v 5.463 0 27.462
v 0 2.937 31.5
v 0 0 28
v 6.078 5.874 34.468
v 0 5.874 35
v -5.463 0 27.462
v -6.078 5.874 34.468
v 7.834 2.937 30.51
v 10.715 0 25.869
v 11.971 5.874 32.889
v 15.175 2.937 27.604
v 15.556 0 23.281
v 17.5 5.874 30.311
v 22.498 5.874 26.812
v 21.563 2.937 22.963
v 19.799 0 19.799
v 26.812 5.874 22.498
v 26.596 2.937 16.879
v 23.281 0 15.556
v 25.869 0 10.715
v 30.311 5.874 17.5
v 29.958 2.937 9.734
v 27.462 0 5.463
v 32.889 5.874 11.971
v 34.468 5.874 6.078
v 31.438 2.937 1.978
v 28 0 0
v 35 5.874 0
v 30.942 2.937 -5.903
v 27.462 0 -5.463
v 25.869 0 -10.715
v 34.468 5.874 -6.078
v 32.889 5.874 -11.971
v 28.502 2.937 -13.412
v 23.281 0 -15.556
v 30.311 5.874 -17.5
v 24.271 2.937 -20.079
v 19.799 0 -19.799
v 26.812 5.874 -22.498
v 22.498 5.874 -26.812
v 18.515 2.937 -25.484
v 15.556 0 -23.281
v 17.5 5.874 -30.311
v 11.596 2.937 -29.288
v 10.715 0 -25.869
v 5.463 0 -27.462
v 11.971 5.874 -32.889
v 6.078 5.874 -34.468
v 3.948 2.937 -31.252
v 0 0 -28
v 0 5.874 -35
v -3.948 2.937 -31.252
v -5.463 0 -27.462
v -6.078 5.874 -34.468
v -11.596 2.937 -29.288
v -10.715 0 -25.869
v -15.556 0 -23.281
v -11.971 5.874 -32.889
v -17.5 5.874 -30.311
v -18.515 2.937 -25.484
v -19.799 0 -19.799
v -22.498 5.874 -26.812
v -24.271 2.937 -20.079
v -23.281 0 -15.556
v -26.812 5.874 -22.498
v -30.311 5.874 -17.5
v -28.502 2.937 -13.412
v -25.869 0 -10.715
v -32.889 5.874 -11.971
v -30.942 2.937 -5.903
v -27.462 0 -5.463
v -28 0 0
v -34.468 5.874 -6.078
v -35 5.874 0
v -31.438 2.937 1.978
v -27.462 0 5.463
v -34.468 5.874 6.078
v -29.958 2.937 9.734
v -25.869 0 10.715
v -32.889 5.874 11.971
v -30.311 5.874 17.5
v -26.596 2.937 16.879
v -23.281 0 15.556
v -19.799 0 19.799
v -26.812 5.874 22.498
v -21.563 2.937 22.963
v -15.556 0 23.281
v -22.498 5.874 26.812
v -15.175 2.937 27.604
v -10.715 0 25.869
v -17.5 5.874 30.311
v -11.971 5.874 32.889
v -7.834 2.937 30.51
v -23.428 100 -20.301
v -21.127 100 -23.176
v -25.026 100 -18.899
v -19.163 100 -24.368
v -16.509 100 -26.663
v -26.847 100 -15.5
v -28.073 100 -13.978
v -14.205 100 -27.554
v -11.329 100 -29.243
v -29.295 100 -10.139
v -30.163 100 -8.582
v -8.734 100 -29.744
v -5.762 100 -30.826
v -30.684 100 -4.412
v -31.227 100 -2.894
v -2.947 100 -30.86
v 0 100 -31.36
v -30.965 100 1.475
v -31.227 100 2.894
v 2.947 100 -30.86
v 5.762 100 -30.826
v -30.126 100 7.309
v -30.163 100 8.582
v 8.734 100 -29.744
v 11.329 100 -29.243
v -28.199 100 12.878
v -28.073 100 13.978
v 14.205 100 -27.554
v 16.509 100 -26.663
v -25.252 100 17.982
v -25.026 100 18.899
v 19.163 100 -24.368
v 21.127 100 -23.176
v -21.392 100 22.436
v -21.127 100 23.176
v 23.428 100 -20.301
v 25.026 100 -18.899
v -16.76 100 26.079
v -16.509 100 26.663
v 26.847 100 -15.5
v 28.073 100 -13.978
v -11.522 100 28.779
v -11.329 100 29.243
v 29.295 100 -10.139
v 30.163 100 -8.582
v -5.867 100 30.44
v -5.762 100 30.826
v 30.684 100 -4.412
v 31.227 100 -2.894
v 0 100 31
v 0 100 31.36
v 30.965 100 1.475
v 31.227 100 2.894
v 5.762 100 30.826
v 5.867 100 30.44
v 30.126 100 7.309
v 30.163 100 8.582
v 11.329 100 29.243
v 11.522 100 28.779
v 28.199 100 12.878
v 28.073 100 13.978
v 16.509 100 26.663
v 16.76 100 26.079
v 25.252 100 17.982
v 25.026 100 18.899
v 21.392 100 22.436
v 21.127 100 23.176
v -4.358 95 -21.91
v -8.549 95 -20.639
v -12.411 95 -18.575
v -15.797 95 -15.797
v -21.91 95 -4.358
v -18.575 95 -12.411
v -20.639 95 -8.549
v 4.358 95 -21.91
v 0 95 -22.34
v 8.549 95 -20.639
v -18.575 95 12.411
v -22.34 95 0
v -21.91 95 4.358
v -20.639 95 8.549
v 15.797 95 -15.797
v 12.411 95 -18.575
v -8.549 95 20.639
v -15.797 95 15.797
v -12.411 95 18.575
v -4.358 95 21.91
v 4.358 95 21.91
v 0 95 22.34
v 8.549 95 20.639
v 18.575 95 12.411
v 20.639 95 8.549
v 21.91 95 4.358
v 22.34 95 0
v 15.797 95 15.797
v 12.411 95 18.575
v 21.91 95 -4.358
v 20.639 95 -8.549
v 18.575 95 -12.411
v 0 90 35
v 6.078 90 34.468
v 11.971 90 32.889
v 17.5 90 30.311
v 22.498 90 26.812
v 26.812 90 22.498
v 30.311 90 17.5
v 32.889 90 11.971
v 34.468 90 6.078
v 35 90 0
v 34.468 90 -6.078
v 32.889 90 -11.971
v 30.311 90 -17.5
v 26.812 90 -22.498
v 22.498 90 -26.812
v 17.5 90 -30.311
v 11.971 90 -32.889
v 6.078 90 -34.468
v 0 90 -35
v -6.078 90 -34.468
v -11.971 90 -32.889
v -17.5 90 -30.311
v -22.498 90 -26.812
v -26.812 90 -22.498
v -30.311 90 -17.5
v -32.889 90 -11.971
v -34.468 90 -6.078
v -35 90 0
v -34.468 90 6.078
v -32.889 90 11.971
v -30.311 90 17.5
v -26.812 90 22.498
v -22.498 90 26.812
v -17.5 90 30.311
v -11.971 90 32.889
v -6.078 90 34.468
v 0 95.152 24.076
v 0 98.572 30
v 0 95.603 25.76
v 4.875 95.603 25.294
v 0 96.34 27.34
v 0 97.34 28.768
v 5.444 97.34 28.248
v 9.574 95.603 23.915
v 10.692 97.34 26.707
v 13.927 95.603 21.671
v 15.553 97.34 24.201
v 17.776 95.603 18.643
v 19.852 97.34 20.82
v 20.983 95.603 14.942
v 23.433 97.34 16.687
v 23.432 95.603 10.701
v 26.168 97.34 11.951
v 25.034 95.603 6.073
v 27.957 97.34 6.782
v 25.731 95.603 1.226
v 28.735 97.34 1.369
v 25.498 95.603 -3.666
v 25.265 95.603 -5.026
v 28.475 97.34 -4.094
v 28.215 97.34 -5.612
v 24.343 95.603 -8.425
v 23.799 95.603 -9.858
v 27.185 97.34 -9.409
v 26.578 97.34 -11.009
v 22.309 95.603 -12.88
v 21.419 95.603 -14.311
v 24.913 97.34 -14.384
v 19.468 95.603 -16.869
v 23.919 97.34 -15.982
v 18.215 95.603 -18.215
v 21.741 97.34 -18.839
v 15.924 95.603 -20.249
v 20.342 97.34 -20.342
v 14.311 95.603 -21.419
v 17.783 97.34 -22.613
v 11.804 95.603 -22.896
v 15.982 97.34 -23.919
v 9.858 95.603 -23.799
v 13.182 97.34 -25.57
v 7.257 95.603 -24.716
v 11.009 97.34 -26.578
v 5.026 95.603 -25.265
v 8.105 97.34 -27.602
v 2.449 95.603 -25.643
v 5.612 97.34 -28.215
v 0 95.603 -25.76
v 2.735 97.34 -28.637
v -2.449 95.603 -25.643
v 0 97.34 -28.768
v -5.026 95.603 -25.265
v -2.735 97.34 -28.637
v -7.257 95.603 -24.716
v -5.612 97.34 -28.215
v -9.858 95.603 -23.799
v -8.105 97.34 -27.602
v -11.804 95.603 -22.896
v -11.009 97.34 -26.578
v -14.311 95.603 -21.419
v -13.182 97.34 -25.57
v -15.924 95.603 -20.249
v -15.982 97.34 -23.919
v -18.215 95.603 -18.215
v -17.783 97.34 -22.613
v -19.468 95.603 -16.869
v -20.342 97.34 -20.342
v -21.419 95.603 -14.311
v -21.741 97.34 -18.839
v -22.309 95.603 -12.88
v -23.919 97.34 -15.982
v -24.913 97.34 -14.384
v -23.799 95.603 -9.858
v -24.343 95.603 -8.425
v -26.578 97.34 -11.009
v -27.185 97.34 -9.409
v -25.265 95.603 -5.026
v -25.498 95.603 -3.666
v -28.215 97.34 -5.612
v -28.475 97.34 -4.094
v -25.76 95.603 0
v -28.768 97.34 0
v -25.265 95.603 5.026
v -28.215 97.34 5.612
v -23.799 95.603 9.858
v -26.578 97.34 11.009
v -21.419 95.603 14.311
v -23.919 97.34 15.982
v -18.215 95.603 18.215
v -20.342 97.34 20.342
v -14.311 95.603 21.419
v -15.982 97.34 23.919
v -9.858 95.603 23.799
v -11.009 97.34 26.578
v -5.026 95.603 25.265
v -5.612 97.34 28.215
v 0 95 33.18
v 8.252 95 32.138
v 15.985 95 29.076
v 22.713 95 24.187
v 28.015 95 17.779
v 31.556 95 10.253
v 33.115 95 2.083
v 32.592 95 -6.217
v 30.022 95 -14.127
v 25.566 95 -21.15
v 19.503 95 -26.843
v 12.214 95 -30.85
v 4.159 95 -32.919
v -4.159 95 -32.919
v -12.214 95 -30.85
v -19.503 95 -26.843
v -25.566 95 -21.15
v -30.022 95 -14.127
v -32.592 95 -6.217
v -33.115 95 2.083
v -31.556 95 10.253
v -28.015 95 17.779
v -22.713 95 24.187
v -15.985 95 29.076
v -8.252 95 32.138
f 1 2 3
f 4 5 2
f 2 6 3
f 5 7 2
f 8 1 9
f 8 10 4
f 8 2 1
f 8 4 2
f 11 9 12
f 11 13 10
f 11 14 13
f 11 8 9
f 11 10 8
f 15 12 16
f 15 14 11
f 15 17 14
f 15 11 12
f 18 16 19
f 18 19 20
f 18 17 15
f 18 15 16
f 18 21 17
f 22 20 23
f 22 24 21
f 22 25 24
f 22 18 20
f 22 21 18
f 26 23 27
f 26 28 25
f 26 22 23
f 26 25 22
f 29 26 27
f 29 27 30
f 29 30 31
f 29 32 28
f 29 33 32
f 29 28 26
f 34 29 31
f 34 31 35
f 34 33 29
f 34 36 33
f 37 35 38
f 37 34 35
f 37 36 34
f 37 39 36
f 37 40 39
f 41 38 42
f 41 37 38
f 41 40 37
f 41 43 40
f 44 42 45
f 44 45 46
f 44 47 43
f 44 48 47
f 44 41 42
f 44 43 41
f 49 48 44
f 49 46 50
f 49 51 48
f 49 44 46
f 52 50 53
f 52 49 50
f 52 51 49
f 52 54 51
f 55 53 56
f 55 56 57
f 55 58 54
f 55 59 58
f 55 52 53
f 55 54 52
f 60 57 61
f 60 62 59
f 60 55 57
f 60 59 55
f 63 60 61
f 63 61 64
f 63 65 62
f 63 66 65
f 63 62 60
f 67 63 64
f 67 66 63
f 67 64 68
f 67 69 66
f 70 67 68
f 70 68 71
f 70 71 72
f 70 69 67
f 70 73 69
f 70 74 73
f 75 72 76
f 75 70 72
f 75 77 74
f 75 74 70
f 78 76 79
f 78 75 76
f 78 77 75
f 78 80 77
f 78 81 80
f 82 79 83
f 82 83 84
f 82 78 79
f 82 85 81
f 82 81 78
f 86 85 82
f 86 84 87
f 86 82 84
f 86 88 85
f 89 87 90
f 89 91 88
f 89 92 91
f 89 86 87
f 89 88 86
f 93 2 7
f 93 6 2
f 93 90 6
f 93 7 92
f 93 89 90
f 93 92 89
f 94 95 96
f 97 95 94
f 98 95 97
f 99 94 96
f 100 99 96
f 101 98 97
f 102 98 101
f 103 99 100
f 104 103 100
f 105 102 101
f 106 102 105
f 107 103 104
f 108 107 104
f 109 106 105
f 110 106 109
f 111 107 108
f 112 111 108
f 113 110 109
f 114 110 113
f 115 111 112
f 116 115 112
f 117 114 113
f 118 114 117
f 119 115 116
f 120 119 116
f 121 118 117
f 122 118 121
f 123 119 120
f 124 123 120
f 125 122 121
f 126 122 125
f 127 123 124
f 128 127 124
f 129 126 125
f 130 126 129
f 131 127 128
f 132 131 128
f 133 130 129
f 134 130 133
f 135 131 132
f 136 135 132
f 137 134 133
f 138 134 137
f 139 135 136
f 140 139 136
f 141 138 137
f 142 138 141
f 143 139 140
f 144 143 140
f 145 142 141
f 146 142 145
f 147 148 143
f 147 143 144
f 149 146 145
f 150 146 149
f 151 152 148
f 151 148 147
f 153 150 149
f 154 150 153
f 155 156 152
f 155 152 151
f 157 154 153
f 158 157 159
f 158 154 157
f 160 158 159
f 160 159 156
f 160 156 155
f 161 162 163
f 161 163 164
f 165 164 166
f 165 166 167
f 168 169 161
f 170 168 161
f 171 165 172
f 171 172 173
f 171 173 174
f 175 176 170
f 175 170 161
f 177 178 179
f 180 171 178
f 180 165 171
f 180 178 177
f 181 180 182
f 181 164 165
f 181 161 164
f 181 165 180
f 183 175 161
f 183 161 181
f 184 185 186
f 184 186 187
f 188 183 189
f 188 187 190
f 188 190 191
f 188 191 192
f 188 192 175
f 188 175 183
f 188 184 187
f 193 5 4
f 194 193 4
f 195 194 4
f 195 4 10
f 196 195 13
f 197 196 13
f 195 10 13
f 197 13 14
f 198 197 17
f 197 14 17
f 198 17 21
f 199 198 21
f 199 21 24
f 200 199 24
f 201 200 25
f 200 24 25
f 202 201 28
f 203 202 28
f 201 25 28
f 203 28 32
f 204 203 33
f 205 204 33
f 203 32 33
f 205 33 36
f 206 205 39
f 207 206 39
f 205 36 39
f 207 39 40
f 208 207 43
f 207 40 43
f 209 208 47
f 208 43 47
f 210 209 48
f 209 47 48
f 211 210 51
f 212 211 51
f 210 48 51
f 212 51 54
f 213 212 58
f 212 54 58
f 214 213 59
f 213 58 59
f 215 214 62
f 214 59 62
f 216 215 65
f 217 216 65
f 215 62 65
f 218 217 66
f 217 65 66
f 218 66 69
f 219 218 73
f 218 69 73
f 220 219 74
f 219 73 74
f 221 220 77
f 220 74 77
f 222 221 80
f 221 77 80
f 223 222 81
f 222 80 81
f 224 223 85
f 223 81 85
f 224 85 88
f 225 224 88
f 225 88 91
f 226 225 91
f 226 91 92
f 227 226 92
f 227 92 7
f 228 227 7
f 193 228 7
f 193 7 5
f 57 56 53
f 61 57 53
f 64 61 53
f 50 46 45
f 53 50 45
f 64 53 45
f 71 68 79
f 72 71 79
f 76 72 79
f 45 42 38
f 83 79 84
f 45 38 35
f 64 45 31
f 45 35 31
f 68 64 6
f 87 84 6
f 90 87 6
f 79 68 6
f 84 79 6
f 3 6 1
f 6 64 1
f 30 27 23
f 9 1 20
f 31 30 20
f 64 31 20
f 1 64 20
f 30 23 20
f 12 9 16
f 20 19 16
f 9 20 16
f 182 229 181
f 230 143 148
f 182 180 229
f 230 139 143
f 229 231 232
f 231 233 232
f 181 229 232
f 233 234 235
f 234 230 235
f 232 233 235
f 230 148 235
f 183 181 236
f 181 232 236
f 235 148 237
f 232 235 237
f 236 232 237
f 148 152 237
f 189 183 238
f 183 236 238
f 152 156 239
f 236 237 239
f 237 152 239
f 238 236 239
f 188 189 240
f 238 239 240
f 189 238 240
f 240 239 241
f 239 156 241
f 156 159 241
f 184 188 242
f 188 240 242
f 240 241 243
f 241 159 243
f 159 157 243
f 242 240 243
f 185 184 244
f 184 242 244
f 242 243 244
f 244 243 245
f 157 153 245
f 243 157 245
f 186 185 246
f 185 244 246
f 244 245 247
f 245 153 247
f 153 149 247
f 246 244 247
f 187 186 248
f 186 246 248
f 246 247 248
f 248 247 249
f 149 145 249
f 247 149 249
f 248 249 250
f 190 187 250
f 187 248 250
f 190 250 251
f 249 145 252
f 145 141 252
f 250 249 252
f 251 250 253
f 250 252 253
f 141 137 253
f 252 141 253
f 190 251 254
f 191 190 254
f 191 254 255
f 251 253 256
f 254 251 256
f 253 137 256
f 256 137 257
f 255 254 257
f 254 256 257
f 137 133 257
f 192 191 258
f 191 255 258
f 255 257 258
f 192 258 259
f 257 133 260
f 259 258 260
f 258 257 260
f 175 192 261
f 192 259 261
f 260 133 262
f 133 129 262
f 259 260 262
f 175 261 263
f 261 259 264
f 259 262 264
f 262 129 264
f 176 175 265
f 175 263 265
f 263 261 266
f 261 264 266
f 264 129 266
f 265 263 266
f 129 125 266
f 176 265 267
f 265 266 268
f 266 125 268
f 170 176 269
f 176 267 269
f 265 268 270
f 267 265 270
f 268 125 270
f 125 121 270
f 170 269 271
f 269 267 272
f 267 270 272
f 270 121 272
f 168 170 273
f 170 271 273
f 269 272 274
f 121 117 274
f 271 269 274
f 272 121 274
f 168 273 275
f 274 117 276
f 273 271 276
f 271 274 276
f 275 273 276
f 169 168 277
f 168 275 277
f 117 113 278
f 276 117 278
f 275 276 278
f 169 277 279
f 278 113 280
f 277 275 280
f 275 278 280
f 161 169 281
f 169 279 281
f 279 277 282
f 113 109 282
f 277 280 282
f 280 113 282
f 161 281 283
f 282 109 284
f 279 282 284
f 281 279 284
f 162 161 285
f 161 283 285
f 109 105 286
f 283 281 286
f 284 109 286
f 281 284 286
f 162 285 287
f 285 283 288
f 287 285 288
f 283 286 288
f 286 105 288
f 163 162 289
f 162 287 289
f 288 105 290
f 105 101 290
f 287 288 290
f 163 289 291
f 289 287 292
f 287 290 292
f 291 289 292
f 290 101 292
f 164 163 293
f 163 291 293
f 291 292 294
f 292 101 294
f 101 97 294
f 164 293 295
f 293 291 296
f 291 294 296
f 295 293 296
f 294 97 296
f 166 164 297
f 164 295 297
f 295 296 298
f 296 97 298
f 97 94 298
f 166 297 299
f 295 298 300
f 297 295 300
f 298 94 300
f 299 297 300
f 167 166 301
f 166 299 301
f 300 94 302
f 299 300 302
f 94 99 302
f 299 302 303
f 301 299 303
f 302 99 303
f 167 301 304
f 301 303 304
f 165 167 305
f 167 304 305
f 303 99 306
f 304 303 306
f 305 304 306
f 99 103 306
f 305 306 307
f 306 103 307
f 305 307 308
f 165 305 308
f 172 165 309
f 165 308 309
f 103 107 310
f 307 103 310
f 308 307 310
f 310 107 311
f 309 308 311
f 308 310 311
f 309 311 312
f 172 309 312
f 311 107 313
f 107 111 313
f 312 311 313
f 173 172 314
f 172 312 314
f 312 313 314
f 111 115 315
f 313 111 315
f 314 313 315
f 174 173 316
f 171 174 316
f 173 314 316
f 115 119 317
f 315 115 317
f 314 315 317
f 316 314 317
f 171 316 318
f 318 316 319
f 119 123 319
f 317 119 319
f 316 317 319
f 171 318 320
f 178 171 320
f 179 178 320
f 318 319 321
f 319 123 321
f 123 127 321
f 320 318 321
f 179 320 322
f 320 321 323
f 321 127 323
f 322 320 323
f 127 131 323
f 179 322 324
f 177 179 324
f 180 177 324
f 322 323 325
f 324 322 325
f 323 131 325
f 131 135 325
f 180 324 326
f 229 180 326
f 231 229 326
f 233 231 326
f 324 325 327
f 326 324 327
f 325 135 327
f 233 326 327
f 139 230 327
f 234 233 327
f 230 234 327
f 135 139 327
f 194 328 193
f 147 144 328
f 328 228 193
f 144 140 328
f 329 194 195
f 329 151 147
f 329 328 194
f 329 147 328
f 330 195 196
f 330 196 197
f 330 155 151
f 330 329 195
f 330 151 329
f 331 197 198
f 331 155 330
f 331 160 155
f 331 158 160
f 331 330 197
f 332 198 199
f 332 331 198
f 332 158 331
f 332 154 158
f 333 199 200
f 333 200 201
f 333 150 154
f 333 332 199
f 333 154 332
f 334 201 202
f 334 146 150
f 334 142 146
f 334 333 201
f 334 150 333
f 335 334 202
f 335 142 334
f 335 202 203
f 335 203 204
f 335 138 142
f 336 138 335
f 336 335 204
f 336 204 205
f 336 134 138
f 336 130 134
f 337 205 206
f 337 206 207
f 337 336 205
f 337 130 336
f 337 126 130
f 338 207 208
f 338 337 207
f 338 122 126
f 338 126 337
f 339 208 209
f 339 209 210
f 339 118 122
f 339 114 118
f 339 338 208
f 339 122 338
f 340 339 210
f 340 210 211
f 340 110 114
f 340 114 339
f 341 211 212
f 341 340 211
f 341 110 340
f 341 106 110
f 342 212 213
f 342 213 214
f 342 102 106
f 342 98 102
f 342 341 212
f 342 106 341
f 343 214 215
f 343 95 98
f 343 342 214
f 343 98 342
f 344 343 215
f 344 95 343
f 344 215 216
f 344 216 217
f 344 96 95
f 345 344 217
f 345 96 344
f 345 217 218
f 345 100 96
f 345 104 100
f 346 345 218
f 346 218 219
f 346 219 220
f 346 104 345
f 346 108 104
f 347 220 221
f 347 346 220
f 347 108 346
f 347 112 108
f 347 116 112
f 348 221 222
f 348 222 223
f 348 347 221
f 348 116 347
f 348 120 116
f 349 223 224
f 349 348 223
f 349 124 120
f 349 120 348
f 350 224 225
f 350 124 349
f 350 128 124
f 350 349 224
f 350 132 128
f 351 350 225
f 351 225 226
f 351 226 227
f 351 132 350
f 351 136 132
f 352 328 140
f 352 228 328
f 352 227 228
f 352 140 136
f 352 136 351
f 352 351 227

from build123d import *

# Parameters (mm, degrees)
SKETCH1_R           = 35
BOSS_EXTRUDE1_DEPTH = 100
CHAMFER1_SIZE       = 10
CHAMFER1_SIZE2      = 3.639702343
CHAMFER2_SIZE       = 7
CHAMFER2_SIZE2      = 5.873697418
SKETCH2_R           = 31
CUT_EXTRUDE1_DEPTH  = 5
FILLET1_R           = 10


with BuildPart() as part:
    # Sketch1 → Boss-Extrude1 (new body)
    with BuildSketch(Plane(origin=(0, 0, 0), x_dir=(1, 0, 0), z_dir=(0, 1, 0))):
        with Locations(Location((0, 0, 0), (0, 0, 270))):
            Circle(SKETCH1_R)
    extrude(amount=BOSS_EXTRUDE1_DEPTH)

    # Chamfer1
    chamfer1_edges = [part.edges().sort_by_distance(p)[0] for p in [
        (0, 100, -35),
    ]]
    chamfer1_side = [part.faces().sort_by_distance(p)[0] for p in [
        (0, 50, -35),
    ]]
    chamfer(chamfer1_edges, length=CHAMFER1_SIZE, length2=CHAMFER1_SIZE2, reference=chamfer1_side[0])

    # Chamfer2
    chamfer2_edges = [part.edges().sort_by_distance(p)[0] for p in [
        (0, 0, -35),
    ]]
    chamfer2_side = [part.faces().sort_by_distance(p)[0] for p in [
        (0, 0, 0),
    ]]
    chamfer(chamfer2_edges, length=CHAMFER2_SIZE, length2=CHAMFER2_SIZE2, reference=chamfer2_side[0])

    # Sketch2 → Cut-Extrude1 (cut)
    with BuildSketch(Plane(origin=(0, 100, 0), x_dir=(1, 0, 0), z_dir=(0, 1, 0))):
        with Locations(Location((0, 0, 0), (0, 0, 270))):
            Circle(SKETCH2_R)
    extrude(amount=-CUT_EXTRUDE1_DEPTH, mode=Mode.SUBTRACT)

    # Fillet1
    # the kernel refuses this fillet: 10 mm, written as the material it adds along each edge
    with BuildSketch(Plane(origin=(0, 95, 0), x_dir=(0, 0, 1), z_dir=(-1, 0, 0))) as fillet1_piece_1:
        with BuildLine():
            CenterArc((22.339745962, 10), FILLET1_R, 270, 60)
            Line((22.339745962, 0), (22.339745962, -0.2))
            Line((22.339745962, -0.2), (31, -0.2))
            Line((31, -0.2), (31.2, 0))
            ThreePointArc((31.2, 0), (31.2, 2.5), (31.173205081, 4.9))
            Line((31.173205081, 4.9), (31, 5))
        make_face()
    revolve(axis=Axis((0, 95, 0), (0, 1, 0)))


solid = part.part
